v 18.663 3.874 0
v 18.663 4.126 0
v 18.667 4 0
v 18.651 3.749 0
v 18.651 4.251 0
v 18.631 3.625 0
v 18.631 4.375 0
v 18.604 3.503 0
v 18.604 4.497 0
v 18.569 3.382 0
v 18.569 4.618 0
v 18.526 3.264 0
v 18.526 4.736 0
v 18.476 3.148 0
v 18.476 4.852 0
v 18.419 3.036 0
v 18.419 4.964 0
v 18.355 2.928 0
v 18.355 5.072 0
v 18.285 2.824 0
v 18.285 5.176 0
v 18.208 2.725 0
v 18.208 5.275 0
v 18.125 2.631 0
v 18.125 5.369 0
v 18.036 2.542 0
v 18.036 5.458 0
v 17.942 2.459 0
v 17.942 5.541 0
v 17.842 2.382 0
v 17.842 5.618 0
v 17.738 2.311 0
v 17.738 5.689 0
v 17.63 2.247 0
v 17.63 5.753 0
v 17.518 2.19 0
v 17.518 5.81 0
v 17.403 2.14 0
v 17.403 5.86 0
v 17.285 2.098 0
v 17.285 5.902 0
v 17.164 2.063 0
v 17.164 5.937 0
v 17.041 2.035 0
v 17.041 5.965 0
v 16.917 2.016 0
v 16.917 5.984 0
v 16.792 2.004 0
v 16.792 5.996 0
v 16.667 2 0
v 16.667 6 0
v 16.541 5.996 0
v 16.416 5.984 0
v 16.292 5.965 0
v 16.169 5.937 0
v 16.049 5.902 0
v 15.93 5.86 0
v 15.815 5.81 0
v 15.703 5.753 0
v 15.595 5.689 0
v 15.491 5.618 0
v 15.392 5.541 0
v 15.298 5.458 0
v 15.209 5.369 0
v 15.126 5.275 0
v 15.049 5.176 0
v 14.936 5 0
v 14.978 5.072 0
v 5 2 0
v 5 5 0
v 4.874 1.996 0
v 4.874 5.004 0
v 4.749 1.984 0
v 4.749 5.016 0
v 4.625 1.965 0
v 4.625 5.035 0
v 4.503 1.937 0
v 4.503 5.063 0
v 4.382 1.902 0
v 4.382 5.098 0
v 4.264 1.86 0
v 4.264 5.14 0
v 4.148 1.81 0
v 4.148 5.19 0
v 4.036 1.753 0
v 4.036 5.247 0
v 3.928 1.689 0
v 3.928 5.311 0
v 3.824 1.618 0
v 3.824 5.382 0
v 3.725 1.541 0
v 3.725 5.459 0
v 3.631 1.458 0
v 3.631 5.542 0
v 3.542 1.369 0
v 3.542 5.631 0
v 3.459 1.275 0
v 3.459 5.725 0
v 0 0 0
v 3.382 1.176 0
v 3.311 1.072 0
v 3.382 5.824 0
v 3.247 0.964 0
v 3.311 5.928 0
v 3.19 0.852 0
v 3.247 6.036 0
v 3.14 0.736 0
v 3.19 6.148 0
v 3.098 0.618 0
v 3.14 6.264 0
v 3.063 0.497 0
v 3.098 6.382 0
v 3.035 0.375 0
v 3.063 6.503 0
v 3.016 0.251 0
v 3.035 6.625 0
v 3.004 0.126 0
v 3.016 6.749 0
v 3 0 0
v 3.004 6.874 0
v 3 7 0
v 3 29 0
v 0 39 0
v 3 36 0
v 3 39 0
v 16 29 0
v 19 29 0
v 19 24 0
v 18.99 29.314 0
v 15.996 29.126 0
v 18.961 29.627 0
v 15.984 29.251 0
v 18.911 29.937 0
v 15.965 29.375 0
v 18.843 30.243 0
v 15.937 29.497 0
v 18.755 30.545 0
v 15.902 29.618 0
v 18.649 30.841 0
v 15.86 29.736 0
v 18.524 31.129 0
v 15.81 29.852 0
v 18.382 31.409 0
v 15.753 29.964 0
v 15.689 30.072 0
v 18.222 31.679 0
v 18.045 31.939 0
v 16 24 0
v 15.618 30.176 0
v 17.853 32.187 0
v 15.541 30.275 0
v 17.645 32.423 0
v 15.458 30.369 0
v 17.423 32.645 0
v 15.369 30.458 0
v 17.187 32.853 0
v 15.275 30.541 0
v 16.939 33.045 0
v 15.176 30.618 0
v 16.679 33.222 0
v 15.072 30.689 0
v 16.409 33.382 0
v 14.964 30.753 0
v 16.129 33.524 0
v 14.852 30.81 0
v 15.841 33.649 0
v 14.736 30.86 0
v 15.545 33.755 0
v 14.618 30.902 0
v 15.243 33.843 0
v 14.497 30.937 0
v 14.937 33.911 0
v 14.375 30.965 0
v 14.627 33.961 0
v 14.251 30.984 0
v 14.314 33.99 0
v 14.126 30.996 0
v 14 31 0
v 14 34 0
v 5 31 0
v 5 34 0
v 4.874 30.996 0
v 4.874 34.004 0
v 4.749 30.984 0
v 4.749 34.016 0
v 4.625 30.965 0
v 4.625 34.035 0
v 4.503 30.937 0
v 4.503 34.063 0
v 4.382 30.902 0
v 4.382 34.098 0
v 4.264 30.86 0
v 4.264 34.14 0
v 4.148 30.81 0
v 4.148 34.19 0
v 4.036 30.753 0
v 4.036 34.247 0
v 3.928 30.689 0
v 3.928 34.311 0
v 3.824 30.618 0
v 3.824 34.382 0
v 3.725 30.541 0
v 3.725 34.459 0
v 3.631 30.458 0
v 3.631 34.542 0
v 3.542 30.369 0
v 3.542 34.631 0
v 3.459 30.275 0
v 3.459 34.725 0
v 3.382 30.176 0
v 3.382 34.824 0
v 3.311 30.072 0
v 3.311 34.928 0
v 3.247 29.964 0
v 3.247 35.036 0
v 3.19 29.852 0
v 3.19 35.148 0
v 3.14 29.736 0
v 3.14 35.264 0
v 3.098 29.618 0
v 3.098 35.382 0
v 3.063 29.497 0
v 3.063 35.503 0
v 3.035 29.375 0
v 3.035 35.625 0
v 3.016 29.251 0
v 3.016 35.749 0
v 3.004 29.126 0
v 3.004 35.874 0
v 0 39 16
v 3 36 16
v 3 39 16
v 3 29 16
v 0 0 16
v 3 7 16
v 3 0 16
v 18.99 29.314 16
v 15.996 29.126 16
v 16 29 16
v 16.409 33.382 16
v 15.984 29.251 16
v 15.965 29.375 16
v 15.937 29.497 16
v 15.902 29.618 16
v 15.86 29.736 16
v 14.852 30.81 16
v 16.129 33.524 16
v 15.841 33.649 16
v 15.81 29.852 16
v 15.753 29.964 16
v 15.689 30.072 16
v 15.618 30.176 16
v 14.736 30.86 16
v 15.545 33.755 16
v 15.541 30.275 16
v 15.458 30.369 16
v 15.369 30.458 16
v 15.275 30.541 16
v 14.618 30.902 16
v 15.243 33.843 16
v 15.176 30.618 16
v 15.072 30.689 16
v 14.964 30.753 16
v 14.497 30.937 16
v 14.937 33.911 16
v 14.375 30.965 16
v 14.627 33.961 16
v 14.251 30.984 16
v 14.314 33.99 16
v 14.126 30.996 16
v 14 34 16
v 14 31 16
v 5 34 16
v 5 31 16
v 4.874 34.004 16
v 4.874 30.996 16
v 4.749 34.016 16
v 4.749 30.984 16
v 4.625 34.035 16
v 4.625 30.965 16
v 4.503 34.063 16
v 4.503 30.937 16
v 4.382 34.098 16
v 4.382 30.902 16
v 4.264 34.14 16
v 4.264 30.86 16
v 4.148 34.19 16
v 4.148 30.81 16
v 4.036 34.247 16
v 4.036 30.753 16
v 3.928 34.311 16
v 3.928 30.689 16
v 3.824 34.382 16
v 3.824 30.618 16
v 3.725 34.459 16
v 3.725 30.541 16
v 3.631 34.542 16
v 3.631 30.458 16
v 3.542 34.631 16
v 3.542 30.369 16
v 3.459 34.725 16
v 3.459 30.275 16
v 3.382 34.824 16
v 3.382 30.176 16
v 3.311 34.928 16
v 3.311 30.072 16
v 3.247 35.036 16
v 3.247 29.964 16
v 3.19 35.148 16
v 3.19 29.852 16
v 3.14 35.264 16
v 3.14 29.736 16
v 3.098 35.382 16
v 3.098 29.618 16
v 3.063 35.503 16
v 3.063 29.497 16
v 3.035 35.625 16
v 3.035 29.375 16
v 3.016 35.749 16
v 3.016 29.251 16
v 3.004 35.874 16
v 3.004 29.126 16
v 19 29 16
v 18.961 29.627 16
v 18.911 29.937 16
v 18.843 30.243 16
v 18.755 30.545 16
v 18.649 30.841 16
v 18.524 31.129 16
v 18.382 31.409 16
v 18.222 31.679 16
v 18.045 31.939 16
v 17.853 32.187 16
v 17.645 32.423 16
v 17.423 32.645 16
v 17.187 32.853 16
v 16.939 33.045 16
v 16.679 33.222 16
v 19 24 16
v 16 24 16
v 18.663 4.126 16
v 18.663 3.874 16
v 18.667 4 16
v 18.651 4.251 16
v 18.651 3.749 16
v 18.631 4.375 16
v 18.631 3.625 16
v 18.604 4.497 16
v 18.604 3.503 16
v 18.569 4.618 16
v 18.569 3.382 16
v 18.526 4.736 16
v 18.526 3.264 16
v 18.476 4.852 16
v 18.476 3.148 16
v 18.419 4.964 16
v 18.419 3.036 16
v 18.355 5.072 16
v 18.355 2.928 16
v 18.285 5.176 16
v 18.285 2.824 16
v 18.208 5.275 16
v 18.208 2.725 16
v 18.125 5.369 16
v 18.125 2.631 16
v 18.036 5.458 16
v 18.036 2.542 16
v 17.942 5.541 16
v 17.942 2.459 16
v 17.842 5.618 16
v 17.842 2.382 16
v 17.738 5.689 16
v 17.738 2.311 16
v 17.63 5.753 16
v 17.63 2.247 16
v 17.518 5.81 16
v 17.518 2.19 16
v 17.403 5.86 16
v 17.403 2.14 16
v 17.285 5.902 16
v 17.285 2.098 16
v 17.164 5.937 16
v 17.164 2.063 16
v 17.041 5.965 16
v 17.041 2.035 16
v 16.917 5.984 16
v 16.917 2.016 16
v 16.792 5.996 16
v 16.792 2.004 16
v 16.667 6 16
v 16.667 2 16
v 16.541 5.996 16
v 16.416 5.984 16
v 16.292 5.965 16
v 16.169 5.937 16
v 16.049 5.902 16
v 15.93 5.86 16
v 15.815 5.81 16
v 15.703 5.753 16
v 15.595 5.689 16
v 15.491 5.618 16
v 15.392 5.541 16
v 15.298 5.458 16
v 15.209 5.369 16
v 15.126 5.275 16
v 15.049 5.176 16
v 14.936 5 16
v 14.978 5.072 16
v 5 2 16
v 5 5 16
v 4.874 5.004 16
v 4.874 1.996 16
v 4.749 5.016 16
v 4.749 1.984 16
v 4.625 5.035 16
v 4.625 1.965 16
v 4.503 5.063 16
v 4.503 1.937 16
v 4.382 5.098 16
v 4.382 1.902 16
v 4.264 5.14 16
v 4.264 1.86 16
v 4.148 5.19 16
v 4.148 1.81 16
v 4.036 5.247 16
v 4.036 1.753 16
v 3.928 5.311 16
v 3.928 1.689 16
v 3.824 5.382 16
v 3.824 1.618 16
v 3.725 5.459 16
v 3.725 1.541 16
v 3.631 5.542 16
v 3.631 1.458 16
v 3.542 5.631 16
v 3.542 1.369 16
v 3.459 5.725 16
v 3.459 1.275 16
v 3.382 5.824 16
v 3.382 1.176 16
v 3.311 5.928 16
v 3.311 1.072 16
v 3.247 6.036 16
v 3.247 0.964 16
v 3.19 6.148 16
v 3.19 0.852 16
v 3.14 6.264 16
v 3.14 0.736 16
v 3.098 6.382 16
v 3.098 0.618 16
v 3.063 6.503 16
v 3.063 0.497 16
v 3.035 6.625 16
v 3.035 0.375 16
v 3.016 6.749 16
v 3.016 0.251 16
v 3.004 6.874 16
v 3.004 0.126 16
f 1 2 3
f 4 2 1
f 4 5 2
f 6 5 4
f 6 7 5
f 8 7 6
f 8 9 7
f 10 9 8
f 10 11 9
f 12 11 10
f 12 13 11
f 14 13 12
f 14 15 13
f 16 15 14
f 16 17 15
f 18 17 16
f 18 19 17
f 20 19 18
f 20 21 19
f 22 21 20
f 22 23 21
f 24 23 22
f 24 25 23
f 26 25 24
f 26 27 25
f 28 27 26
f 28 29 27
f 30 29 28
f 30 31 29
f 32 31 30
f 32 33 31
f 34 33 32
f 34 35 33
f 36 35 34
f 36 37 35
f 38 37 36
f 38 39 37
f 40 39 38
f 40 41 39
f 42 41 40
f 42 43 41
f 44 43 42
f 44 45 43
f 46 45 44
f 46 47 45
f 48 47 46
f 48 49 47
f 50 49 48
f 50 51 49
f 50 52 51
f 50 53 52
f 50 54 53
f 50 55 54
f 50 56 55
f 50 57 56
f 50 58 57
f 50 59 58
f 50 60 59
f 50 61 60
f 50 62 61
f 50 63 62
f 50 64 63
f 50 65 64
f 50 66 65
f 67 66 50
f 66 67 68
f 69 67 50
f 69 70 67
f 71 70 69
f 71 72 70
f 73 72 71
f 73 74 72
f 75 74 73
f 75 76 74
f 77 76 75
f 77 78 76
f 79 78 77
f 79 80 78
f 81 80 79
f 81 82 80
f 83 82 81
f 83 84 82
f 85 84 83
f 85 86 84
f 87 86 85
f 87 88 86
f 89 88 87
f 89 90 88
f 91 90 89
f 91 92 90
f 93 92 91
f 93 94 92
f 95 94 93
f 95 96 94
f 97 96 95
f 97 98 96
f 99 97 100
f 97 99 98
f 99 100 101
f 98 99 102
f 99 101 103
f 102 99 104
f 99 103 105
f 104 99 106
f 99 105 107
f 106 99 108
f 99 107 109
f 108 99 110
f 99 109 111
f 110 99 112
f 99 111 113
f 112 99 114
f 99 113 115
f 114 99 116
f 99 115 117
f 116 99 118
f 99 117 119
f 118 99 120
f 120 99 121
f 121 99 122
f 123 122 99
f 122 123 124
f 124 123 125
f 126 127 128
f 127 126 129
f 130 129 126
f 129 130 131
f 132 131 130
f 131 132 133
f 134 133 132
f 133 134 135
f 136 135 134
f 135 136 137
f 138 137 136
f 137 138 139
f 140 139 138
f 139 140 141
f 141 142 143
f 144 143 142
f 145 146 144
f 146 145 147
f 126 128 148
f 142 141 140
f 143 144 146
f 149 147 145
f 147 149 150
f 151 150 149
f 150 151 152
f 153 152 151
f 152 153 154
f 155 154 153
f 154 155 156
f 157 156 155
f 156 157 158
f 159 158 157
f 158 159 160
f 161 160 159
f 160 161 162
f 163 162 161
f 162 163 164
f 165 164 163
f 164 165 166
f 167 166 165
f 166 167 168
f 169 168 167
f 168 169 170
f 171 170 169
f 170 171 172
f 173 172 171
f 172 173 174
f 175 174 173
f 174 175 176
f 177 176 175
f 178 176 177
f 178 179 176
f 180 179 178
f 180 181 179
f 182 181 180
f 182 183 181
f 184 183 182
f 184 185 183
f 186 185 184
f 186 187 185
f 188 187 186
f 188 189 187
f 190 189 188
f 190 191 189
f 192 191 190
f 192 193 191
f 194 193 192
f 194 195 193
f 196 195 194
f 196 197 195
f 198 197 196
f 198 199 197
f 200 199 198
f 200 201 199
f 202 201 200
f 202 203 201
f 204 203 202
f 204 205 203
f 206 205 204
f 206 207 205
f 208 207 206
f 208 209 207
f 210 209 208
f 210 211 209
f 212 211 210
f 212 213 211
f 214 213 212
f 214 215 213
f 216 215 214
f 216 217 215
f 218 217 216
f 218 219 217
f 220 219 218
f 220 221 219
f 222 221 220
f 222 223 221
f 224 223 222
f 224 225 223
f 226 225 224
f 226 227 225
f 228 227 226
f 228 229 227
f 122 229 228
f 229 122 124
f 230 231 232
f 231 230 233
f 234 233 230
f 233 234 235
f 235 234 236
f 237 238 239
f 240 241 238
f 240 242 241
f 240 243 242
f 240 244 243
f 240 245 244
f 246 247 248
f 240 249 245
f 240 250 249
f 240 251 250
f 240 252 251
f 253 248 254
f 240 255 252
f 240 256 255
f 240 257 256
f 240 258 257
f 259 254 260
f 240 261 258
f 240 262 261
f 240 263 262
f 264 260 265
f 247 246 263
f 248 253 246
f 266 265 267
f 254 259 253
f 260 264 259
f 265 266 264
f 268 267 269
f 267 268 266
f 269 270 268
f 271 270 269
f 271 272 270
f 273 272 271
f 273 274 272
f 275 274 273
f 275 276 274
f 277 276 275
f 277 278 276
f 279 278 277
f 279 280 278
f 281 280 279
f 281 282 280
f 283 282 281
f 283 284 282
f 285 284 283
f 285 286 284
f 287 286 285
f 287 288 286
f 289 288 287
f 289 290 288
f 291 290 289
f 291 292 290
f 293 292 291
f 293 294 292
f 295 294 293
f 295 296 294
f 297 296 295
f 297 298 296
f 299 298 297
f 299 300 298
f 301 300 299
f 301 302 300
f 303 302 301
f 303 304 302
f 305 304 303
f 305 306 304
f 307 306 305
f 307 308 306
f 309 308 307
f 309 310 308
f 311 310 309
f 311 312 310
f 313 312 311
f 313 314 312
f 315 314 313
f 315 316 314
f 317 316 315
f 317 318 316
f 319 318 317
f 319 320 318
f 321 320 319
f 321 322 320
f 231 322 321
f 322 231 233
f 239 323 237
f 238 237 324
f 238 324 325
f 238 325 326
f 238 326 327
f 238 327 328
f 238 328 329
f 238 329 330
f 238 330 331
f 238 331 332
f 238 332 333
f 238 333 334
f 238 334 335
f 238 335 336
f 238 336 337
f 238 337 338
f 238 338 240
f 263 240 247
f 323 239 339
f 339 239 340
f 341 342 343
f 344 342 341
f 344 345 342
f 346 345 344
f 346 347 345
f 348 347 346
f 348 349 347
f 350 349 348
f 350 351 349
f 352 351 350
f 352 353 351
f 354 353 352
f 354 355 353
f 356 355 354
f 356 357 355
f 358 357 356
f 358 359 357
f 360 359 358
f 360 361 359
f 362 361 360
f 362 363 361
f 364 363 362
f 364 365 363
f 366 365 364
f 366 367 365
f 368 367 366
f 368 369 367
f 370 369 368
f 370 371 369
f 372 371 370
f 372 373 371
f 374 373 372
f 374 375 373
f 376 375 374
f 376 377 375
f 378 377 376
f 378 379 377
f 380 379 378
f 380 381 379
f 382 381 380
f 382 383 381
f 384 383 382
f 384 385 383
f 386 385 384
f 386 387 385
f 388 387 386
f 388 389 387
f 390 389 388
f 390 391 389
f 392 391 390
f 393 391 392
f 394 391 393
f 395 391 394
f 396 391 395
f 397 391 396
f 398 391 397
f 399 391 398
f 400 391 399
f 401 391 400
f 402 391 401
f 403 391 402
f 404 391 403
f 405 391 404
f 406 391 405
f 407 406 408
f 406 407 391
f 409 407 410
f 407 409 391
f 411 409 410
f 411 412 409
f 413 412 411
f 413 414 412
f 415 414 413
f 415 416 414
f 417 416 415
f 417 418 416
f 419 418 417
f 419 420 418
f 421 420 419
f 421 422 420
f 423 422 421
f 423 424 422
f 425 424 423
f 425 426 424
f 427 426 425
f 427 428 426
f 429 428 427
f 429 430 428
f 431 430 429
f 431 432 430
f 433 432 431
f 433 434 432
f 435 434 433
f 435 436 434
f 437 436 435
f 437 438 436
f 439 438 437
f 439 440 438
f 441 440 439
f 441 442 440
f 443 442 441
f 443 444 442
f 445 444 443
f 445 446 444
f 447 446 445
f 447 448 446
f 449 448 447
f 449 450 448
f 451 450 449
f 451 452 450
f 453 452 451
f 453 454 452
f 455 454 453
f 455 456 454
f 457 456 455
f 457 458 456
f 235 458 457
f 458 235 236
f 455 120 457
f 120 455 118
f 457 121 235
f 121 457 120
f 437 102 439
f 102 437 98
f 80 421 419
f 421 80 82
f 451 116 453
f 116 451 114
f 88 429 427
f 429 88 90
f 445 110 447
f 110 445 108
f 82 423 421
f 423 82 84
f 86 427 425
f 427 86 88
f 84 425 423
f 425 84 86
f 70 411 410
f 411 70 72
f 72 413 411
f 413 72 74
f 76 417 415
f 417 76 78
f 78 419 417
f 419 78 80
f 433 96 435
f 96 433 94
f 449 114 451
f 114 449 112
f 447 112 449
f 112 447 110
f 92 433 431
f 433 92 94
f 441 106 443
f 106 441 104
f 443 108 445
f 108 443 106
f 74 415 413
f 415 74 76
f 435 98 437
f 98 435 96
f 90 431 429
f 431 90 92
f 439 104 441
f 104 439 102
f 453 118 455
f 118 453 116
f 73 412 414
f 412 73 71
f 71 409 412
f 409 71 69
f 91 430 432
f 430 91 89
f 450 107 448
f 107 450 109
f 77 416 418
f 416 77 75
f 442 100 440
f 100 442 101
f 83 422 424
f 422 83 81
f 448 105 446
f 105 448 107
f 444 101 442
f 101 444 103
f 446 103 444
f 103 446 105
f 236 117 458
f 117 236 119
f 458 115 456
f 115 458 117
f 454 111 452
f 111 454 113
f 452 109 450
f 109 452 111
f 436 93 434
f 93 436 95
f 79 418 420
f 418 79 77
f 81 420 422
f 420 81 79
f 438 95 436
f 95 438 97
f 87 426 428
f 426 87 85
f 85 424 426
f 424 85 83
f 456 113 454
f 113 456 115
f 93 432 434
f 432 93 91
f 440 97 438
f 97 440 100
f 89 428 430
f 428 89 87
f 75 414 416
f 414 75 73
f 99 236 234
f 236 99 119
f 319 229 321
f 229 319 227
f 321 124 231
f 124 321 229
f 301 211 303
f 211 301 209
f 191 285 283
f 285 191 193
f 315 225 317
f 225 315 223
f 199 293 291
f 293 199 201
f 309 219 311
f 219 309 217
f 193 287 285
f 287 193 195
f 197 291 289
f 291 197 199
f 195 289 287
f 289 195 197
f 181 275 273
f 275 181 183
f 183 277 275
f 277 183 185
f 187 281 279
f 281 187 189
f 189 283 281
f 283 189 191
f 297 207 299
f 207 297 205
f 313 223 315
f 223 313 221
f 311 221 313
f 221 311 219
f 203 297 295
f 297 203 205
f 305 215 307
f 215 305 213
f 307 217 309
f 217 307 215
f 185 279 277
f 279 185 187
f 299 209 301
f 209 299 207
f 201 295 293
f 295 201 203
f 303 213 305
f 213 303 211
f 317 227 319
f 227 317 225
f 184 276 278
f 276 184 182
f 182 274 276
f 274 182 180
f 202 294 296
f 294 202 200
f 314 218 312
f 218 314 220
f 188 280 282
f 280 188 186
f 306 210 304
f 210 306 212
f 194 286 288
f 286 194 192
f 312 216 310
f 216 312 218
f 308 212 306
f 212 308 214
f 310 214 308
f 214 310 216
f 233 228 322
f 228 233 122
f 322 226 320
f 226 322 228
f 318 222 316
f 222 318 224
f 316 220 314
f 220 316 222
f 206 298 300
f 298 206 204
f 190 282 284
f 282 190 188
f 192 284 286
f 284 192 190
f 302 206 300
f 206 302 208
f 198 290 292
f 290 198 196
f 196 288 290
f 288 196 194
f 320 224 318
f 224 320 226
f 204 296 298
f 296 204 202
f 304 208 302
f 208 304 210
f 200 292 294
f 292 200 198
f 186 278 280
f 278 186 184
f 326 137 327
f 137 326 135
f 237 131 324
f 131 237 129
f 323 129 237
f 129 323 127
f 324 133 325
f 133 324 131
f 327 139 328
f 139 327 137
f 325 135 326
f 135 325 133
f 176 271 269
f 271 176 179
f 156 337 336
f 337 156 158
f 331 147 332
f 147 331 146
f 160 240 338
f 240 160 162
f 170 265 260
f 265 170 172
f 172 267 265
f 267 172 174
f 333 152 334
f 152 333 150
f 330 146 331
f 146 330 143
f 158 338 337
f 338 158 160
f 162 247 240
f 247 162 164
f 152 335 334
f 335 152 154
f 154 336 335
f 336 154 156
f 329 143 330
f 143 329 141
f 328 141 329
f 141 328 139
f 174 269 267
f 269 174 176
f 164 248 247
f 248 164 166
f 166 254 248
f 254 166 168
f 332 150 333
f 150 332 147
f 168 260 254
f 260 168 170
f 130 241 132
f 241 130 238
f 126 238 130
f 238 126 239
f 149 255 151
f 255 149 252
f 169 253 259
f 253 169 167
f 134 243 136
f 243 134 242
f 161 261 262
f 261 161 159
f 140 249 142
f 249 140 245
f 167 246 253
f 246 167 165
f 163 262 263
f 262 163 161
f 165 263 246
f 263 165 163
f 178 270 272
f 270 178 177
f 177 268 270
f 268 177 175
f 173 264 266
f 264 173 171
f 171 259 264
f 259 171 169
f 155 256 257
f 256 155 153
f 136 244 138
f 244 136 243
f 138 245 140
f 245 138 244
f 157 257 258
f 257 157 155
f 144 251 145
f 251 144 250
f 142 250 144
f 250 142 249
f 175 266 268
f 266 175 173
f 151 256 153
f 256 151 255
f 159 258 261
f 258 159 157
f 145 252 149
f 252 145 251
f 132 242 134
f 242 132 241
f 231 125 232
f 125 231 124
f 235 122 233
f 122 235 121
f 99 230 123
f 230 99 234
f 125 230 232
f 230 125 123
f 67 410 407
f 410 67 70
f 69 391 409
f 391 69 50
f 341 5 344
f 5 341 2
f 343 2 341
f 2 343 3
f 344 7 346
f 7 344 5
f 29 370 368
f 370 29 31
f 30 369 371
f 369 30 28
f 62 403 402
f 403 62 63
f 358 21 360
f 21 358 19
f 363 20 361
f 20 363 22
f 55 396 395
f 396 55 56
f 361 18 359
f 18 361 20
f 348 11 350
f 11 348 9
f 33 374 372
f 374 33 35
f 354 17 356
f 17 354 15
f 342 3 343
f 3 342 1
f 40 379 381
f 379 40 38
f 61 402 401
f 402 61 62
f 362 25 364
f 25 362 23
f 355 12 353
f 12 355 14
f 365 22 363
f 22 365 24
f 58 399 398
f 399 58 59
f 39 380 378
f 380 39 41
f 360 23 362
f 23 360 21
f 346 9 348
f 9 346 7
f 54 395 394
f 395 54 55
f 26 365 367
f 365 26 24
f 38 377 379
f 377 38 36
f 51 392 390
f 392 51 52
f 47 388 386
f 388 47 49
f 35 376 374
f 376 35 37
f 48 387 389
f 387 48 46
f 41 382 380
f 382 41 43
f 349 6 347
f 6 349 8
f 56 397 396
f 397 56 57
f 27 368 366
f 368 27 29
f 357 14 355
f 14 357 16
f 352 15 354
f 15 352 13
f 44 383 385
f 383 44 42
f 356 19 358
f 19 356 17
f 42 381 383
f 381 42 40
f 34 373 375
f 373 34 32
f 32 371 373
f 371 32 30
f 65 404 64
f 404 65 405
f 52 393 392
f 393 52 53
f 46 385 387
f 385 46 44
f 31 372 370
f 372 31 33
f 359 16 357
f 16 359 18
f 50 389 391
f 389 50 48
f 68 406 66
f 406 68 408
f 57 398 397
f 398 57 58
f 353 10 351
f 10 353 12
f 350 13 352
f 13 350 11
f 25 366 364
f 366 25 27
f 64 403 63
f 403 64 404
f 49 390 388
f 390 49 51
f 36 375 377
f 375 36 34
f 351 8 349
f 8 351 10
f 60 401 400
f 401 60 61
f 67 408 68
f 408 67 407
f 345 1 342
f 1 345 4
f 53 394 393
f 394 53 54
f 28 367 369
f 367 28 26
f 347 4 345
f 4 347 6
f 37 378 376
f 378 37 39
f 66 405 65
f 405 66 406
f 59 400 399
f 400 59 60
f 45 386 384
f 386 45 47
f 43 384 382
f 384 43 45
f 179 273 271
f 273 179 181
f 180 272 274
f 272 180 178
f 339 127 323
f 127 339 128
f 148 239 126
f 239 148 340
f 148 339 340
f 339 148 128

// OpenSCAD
$fn = 100;

/*
 *  size_width      = how tall the print is
 *  wall_thickness  = the wall thickness of the print
 *
 *  ║       ─────────────
 *  ╠═════╗ ─────────   │
 *  ║     ║         │   │
 *  ║     ║ ─────   │   │
 *  ║           │   │   │
 *  ║           │   │   │
 *  ╠═══■   ─────────────
 *
 *  │   │ │     │   │   └─ clip_length + (2 * clip_pad)
 *  │   │ │     │   └─ clip_length
 *  │   │ │     └─ clip_hook
 *  │   │ │
 *  │   │ └──── clip_width
 *  │   └────── clip_width / clip_ratio
 *
 *  Shims are curved using r_inner as the radius
 *  ╗ module - corner_shim
 *
 *  ╠ module - corner_joint
 */

wall_thickness = 3;

//*
// wall cabel trunking...
r_inner = 2;
clip_ratio = 1.2; // 2
clip_pad = 5;
clip_length = 29; //30
clip_width = 14; // 15
clip_hook = 5; //clip_width / clip_ratio;
size_width = 16;
// */

/*
// headphone...
r_inner = 2;
clip_ratio = 3;
clip_pad = 10;
clip_length = 30;
clip_width = 30;
clip_hook = 10;
size_width = 40;
// */


offset_step = size_width / 2;
r_outer = r_inner + wall_thickness;

// modules to create joints...
module corner_shim(r_outer, w_thickness, extrude){
    
    r_inner = r_outer - w_thickness;
    o_step = extrude/2;
    
    translate([0, 0, o_step]) {
        intersection(){
            difference(){
                cylinder(r=r_outer, h=extrude, center=true);
                cylinder(r=r_inner, h=extrude+o_step, center=true);    
            };
            translate([r_outer/2, r_outer/2,0]){
                cube([r_outer, r_outer, extrude], center=true);
            }
        }
    }
};

module corner_joint(r_outer, w_thickness, extrude){
    translate([r_outer, r_outer + r_inner,0]){
    rotate([0,0,180]){
        corner_shim(r_outer, w_thickness, extrude);
        translate([0, 2*r_outer - w_thickness, 0]){
            rotate([0,0,-90]){
                corner_shim(r_outer, w_thickness, extrude);
        
                };
            };
        };            
    };    
};

// joints placement
corner_joint(r_outer, wall_thickness, size_width);
translate([0, clip_length, 0]){
    corner_joint(r_outer, wall_thickness, size_width);
};

// wall section
cube([wall_thickness, clip_length + (2 * clip_pad), size_width]);
// top clip
translate([0, r_inner, 0]){
    cube([r_outer + clip_width/clip_ratio, wall_thickness, size_width]);
};
translate([r_outer + clip_width/clip_ratio, r_inner*2, 0]){
    cylinder(r=r_inner, h=size_width);
};

// bottom holder
translate([0, clip_length + r_inner, 0]){
    cube([clip_width, wall_thickness, size_width]);
};
translate([clip_width + r_inner,clip_length - clip_hook,0]){
    cube([wall_thickness, clip_hook, size_width]);
};
translate([clip_width, clip_length, 0]){
    //rotate([0,0,180]){
        corner_shim(r_outer, wall_thickness, size_width);
    //};    
};
